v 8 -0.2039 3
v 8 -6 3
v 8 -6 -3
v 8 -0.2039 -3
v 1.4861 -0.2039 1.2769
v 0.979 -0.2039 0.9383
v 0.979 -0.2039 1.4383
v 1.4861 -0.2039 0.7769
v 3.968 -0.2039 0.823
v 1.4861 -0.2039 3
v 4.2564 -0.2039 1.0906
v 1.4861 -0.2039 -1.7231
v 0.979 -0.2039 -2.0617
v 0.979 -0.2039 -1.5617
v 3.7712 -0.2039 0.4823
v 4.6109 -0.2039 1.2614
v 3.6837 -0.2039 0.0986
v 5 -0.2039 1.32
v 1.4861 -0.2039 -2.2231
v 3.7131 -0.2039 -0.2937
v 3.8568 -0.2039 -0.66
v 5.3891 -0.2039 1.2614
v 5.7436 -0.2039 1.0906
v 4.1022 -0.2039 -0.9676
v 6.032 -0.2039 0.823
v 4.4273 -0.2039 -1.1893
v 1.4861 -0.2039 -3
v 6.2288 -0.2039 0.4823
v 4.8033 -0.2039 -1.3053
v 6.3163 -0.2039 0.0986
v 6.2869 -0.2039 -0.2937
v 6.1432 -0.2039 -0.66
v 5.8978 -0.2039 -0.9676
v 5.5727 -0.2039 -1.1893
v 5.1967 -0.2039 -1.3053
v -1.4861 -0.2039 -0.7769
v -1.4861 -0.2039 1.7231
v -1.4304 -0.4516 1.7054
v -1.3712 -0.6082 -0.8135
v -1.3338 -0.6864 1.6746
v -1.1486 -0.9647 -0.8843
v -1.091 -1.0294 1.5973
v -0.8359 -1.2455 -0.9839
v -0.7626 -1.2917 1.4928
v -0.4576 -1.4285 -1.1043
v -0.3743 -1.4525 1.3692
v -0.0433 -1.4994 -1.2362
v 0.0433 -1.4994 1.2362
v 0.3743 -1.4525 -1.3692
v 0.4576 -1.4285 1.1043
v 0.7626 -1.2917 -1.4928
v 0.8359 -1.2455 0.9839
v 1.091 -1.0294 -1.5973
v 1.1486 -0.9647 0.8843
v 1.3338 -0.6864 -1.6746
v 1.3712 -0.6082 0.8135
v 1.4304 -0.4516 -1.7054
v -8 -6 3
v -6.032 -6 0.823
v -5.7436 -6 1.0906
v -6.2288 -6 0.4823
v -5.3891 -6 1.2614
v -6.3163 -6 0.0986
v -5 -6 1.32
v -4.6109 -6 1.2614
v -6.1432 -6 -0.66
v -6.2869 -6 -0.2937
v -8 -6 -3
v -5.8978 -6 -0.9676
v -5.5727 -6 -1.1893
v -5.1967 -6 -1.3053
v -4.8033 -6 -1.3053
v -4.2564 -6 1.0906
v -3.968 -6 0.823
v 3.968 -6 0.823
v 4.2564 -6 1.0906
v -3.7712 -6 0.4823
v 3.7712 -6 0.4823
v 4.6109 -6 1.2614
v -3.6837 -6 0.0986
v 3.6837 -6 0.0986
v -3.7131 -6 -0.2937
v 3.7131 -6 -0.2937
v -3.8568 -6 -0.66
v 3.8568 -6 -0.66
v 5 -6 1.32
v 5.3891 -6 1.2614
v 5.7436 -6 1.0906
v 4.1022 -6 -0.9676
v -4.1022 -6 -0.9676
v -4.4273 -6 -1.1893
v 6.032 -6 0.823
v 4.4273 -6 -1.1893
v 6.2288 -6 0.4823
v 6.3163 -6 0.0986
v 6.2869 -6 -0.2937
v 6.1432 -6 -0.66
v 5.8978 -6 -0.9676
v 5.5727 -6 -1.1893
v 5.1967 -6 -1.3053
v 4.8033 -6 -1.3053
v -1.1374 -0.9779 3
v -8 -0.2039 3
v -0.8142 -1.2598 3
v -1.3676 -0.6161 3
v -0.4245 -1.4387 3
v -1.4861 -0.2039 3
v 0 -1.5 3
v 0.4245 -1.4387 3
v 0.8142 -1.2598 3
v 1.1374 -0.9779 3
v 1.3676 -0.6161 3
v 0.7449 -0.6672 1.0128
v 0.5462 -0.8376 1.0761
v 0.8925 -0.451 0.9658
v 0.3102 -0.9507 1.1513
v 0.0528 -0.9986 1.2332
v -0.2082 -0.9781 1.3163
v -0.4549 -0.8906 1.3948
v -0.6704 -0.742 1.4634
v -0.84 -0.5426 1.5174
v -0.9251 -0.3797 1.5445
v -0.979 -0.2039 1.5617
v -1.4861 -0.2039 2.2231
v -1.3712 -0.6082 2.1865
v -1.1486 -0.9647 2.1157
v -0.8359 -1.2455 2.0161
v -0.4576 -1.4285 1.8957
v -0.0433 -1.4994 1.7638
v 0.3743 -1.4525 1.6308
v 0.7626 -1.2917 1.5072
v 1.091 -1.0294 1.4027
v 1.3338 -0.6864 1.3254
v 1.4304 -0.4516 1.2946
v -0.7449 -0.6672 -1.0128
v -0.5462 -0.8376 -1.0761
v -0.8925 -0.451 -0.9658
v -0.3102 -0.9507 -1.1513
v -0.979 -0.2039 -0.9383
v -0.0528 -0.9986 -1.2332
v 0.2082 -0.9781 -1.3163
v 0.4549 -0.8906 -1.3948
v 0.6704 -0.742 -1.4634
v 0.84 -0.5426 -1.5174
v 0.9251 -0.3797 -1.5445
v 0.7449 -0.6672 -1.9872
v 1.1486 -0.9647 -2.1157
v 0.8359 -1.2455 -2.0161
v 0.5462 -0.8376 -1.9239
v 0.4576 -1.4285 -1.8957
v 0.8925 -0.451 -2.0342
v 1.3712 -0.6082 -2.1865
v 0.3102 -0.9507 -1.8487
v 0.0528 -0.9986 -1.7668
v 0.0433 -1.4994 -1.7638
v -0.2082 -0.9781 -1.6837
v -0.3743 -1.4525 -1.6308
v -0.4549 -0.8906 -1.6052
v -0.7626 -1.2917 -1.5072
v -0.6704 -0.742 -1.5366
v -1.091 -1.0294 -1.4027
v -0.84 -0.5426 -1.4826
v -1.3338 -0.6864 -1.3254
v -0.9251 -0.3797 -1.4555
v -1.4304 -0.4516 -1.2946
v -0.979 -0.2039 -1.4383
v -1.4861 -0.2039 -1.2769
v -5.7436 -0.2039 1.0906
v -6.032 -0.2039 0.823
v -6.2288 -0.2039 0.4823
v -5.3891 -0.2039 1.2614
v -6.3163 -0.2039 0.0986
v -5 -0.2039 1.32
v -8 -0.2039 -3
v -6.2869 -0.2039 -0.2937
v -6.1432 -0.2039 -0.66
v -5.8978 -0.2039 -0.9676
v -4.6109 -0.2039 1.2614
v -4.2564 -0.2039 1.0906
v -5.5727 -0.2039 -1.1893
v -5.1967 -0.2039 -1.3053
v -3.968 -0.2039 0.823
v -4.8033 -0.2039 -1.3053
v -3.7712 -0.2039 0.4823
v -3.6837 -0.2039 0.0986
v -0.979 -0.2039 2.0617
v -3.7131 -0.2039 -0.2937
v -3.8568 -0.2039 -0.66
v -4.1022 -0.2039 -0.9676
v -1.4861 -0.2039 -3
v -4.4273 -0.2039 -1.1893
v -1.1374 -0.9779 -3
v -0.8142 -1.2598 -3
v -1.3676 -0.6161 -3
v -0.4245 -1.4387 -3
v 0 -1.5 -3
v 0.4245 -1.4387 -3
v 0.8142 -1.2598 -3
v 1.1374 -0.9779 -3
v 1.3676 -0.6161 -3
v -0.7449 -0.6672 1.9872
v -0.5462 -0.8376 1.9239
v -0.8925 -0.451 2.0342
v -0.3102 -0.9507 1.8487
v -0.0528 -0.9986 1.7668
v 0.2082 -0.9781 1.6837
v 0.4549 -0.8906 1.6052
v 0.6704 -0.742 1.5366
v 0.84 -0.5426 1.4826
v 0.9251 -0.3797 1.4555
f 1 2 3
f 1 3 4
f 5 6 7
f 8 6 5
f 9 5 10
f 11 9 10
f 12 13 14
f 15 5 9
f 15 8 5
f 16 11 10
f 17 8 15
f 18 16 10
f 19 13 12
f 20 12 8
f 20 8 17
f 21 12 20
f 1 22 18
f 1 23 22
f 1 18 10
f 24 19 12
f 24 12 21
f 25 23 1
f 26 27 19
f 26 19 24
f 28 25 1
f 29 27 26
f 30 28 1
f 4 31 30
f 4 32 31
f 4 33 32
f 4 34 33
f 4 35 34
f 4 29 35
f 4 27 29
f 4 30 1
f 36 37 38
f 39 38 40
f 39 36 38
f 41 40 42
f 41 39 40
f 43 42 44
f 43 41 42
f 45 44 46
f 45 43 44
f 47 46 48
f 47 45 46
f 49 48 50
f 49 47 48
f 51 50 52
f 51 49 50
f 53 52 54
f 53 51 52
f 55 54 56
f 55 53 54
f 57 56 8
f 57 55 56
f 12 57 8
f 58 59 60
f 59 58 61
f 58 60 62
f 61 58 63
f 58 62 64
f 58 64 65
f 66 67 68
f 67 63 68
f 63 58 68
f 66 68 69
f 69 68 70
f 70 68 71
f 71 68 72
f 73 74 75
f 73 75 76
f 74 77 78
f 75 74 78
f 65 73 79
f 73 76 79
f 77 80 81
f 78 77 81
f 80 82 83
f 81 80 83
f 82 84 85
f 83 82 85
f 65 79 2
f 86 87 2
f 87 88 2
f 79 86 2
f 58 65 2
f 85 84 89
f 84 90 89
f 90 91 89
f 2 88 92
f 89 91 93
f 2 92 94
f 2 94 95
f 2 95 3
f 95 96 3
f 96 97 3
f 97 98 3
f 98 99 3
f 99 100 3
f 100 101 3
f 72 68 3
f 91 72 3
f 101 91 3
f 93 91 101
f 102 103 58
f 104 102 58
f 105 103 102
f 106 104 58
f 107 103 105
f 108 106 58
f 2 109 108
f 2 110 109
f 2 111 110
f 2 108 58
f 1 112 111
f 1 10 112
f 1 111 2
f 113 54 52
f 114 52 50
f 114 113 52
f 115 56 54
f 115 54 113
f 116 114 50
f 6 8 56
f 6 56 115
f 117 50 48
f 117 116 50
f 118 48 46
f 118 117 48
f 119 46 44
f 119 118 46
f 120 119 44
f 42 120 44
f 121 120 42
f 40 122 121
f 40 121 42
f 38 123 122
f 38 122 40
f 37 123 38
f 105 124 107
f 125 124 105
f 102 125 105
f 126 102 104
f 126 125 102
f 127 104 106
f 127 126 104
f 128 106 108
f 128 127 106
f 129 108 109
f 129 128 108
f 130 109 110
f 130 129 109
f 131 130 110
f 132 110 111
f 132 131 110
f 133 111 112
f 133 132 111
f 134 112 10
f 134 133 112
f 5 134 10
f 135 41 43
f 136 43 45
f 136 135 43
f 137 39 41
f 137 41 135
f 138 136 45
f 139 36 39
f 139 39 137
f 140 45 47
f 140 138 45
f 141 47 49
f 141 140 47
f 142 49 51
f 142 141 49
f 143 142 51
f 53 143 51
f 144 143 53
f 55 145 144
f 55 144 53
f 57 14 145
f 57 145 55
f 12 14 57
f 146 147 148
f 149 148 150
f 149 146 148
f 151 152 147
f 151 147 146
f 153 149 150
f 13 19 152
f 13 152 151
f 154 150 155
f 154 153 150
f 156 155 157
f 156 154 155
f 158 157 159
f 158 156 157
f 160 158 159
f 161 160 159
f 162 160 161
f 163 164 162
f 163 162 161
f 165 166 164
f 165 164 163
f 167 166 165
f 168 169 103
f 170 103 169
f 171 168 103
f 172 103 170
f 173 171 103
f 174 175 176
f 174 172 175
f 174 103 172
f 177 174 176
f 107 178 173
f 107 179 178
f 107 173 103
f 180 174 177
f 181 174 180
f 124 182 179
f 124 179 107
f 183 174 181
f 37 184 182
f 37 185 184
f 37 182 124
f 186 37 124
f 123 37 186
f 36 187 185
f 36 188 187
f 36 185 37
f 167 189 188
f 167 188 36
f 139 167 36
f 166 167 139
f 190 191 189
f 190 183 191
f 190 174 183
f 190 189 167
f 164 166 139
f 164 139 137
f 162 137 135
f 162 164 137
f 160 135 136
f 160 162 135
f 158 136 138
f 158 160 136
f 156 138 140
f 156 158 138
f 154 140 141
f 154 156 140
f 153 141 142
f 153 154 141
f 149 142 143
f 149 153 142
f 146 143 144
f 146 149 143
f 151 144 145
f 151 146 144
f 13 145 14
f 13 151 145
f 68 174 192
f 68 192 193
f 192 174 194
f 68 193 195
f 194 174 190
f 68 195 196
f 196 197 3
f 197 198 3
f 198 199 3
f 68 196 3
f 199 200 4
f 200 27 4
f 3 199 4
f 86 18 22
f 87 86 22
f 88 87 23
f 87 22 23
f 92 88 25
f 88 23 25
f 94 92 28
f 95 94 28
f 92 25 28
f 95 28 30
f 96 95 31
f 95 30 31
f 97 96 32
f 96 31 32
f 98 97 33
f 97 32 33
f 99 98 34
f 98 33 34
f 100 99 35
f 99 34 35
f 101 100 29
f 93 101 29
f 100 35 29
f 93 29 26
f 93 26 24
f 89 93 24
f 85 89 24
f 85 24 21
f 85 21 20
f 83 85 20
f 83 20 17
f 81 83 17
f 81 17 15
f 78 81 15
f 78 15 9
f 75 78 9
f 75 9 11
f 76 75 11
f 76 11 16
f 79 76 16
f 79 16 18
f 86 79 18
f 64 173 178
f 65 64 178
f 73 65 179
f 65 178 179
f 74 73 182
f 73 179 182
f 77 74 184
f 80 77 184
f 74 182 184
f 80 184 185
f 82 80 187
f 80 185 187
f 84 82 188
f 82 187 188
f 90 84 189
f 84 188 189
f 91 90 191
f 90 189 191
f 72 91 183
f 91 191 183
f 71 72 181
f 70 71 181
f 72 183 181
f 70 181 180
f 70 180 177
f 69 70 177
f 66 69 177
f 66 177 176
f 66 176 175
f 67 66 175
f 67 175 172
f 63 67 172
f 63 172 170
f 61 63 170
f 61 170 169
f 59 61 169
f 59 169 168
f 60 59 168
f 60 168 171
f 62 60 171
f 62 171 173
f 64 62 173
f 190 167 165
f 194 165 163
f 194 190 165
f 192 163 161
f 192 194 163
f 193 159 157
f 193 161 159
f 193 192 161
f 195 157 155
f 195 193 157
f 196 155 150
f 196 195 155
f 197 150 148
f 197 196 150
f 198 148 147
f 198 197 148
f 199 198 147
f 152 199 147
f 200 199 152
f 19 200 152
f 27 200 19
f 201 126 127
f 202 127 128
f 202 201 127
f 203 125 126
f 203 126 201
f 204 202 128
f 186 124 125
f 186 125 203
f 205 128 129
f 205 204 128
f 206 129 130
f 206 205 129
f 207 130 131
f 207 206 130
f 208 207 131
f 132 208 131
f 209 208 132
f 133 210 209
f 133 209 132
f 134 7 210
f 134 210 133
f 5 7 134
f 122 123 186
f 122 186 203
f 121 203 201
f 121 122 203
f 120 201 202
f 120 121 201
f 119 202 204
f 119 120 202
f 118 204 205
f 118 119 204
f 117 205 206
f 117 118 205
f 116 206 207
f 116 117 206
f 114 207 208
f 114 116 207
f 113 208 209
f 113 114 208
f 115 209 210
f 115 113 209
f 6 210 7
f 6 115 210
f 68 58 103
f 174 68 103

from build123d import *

# Parameters (mm, degrees)
SKETCH_1_W               = 16
SKETCH_1_H               = 12
SKETCH_1_R               = 1.5
EXTRUDE_1_DEPTH          = 3
EXTRUDE_2_DEPTH          = 6
CUT_EXTRUDE_2_DEPTH      = 11.440306509
CUT_EXTRUDE_2_DEPTH_BACK = 11.440306509
SKETCH_8_R               = 1.32
CUT_EXTRUDE_3_DEPTH      = 11.440306509


with BuildPart() as part:
    # 草图1 → 凸台-拉伸1 (new, symmetric)
    with BuildSketch(Plane.XY):
        Rectangle(SKETCH_1_W, SKETCH_1_H)
        Circle(SKETCH_1_R, mode=Mode.SUBTRACT)
    extrude(amount=EXTRUDE_1_DEPTH, both=True)

    # 草图6 → 凸台-拉伸2 (add)
    with BuildSketch(Plane(origin=(0, 0, 0), x_dir=(1, 0, 0), z_dir=(0, 1, 0))):
        Polygon((-1.5, -1.727557465), (-1.5, -2.227557465), (1.5, -1.272442535), (1.5, -0.772442535), align=None)
        Polygon((-1.5, 1.272442535), (-1.5, 0.772442535), (1.5, 1.727557465), (1.5, 2.227557465), align=None)
    extrude(amount=-EXTRUDE_2_DEPTH)

    # 草图7 → 切除-拉伸2 (cut, two sides: drawn at the far end of the back side and taken through both)
    with BuildSketch(Plane.XY.offset(-CUT_EXTRUDE_2_DEPTH_BACK)):
        with BuildLine():
            Line((-8, -0.203898058), (-0.978992126, -0.203898058))
            ThreePointArc((-0.978992126, -0.203898058), (-0.102488717, 0.994734167), (1, 0))
            ThreePointArc((1, 0), (0.994734167, -0.102488717), (0.978992126, -0.203898058))
            Line((0.978992126, -0.203898058), (8, -0.203898058))
            Line((8, -0.203898058), (8, 6))
            Line((8, 6), (-8, 6))
            Line((-8, 6), (-8, -0.203898058))
        make_face()
        with BuildLine():
            Line((0.978992126, -0.203898058), (0, 0))
            Line((0, 0), (-0.978992126, -0.203898058))
            ThreePointArc((-0.978992126, -0.203898058), (0, -1), (0.978992126, -0.203898058))
        make_face()
        with BuildLine():
            Line((-0.978992126, -0.203898058), (0, 0))
            Line((0, 0), (0.978992126, -0.203898058))
            ThreePointArc((0.978992126, -0.203898058), (0.994734167, -0.102488717), (1, 0))
            ThreePointArc((1, 0), (-0.102488717, 0.994734167), (-0.978992126, -0.203898058))
        make_face()
    extrude(amount=CUT_EXTRUDE_2_DEPTH + CUT_EXTRUDE_2_DEPTH_BACK, mode=Mode.SUBTRACT)

    # 草图8 → 切除-拉伸3 (cut, through all)
    with BuildSketch(Plane(origin=(0, 0, 0), x_dir=(1, 0, 0), z_dir=(0, 1, 0))):
        with Locations(Location((-5, 0, 0), (0, 0, 270))):
            Circle(SKETCH_8_R)
        with Locations(Location((5, 0, 0), (0, 0, 270))):
            Circle(SKETCH_8_R)
    extrude(amount=-CUT_EXTRUDE_3_DEPTH, mode=Mode.SUBTRACT)


solid = part.part
